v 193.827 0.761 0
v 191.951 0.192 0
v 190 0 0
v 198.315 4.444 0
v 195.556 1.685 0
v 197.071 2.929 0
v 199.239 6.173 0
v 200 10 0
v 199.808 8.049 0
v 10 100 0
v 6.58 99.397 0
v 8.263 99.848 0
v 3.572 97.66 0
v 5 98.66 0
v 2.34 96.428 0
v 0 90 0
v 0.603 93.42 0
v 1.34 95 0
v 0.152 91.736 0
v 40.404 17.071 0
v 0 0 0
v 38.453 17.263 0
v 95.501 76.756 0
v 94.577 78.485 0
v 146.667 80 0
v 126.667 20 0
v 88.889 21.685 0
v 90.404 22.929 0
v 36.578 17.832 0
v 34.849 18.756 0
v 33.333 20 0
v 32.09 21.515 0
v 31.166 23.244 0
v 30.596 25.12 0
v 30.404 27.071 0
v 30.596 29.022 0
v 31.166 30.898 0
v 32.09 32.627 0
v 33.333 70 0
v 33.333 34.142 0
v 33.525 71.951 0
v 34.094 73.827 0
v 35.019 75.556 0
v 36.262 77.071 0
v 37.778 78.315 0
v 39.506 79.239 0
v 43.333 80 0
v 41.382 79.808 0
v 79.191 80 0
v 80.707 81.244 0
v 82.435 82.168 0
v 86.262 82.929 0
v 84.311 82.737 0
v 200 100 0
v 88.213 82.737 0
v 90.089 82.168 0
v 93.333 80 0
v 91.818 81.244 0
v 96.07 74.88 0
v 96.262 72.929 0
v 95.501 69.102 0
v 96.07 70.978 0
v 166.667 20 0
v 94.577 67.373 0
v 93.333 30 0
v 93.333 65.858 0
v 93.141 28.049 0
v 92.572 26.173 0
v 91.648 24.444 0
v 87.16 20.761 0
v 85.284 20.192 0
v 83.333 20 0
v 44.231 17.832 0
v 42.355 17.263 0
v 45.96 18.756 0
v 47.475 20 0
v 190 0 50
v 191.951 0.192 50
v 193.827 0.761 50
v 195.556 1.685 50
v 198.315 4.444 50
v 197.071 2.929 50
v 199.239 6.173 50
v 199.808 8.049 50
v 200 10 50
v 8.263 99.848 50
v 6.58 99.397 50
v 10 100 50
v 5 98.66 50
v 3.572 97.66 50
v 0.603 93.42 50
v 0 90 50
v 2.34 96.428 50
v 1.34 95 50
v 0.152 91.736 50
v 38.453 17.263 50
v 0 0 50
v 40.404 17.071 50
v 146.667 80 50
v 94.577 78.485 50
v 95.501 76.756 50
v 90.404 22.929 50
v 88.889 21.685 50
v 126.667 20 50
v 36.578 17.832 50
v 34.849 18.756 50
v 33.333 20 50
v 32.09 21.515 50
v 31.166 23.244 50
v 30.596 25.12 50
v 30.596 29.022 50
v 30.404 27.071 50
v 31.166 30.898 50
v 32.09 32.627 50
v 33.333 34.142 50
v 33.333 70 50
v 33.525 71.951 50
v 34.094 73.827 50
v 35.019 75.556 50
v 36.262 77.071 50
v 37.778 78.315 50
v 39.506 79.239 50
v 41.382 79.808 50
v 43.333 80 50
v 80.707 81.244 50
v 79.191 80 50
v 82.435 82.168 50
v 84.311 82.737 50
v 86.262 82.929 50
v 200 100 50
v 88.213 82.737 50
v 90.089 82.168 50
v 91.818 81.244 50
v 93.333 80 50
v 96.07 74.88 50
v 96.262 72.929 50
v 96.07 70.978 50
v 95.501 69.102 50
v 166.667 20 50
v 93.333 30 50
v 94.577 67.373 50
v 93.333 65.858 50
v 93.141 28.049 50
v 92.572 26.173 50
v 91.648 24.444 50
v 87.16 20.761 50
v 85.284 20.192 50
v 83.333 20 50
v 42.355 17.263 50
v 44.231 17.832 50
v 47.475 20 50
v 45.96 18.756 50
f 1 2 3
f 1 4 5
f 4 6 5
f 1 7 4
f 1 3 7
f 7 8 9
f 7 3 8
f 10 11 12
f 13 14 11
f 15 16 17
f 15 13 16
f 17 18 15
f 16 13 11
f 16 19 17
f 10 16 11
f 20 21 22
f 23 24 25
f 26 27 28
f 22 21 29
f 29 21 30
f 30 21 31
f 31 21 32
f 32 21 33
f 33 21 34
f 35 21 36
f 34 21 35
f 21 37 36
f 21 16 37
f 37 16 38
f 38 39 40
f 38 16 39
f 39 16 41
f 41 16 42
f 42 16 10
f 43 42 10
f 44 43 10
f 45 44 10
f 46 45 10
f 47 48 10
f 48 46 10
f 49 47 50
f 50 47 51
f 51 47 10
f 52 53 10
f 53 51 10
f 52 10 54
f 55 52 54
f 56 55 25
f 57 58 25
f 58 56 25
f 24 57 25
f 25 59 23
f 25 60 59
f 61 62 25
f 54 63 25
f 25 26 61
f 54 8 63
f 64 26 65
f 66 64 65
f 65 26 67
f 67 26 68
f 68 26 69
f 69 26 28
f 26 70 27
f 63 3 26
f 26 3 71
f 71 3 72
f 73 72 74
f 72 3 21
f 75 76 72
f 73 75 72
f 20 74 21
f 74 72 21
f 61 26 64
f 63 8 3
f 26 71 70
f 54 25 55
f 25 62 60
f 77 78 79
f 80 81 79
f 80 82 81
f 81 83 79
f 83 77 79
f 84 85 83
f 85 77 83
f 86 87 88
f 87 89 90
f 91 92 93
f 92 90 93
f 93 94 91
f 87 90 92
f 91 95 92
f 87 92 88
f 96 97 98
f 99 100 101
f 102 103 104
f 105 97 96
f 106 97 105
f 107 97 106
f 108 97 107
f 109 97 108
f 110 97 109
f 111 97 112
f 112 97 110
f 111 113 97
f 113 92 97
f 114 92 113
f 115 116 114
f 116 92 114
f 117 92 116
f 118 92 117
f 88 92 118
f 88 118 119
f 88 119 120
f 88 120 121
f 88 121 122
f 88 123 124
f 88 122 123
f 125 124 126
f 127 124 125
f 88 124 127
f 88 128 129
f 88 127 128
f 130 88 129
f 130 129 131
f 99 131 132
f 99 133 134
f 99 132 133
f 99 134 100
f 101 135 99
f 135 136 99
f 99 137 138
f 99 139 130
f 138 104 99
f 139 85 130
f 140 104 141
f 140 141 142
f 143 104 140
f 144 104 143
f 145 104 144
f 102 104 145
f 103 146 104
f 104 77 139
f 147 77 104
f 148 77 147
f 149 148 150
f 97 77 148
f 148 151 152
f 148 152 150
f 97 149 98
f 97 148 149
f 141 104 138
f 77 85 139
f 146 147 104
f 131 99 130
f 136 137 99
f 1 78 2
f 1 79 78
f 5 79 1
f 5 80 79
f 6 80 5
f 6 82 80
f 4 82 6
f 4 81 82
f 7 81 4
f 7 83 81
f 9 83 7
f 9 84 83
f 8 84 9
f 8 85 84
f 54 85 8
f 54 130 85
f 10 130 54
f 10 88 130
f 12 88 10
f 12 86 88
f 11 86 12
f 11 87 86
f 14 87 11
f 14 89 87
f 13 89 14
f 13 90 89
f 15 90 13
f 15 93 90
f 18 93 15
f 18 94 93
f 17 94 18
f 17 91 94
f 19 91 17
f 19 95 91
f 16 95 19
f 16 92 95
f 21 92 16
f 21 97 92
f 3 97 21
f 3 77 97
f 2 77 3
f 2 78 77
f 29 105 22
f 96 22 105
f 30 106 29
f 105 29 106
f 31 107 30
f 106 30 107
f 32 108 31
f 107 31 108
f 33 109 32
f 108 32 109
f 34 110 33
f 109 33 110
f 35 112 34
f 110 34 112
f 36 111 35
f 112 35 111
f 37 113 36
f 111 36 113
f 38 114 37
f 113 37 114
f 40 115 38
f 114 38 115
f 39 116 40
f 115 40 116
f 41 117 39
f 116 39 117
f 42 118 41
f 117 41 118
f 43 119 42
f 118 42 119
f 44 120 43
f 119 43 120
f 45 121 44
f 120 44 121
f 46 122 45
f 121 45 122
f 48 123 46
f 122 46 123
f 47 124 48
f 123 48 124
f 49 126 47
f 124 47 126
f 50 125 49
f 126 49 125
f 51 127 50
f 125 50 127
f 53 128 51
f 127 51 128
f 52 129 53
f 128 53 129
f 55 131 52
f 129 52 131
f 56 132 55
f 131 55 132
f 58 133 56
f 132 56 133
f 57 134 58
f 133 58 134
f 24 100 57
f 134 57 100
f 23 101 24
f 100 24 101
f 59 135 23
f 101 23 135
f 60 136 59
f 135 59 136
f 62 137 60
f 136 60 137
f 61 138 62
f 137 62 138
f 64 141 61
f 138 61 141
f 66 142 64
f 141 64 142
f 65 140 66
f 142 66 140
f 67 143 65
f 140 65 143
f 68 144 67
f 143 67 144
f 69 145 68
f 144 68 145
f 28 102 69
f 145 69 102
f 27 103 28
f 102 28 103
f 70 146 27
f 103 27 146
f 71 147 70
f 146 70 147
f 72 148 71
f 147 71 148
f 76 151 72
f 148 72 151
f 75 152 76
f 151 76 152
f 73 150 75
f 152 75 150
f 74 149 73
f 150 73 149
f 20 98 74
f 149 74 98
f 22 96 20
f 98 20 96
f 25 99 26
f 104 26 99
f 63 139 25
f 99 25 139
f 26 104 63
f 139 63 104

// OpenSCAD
// Generated by Parametrix
ca_myPartF_faceCorners_000 = [ [ 0.0000, 0.0000 ],[ 190.0000, 0.0000 ],[ 191.9509, 0.1921 ],[ 193.8268, 0.7612 ],[ 195.5557, 1.6853 ],[ 197.0711, 2.9289 ],[ 198.3147, 4.4443 ],[ 199.2388, 6.1732 ],[ 199.8079, 8.0491 ],[ 200.0000, 10.0000 ],[ 200.0000, 100.0000 ],[ 10.0000, 100.0000 ],[ 8.2635, 99.8481 ],[ 6.5798, 99.3969 ],[ 5.0000, 98.6603 ],[ 3.5721, 97.6604 ],[ 2.3396, 96.4279 ],[ 1.3397, 95.0000 ],[ 0.6031, 93.4202 ],[ 0.1519, 91.7365 ],[ 0.0000, 90.0000 ],[ 0.0000, 0.0000 ] ];
cb_myPartF_faceCorners_000 = [  0, 1, 2, 3, 4, 5, 6, 7, 8, 9, 10, 11, 12, 13, 14, 15, 16, 17, 18, 19, 20, 21 ];
ca_myPartF_faceCorners_001 = [ [ 47.4755, 20.0000 ],[ 83.3333, 20.0000 ],[ 85.2842, 20.1921 ],[ 87.1602, 20.7612 ],[ 88.8890, 21.6853 ],[ 90.4044, 22.9289 ],[ 91.6480, 24.4443 ],[ 92.5721, 26.1732 ],[ 93.1412, 28.0491 ],[ 93.3333, 30.0000 ],[ 93.3333, 65.8579 ],[ 94.5770, 67.3732 ],[ 95.5011, 69.1021 ],[ 96.0701, 70.9780 ],[ 96.2623, 72.9289 ],[ 96.0701, 74.8798 ],[ 95.5011, 76.7558 ],[ 94.5770, 78.4846 ],[ 93.3333, 80.0000 ],[ 91.8180, 81.2436 ],[ 90.0891, 82.1677 ],[ 88.2132, 82.7368 ],[ 86.2623, 82.9289 ],[ 84.3114, 82.7368 ],[ 82.4354, 82.1677 ],[ 80.7066, 81.2436 ],[ 79.1912, 80.0000 ],[ 43.3333, 80.0000 ],[ 41.3824, 79.8079 ],[ 39.5065, 79.2388 ],[ 37.7776, 78.3147 ],[ 36.2623, 77.0711 ],[ 35.0186, 75.5557 ],[ 34.0945, 73.8268 ],[ 33.5255, 71.9509 ],[ 33.3333, 70.0000 ],[ 33.3333, 34.1421 ],[ 32.0897, 32.6268 ],[ 31.1656, 30.8979 ],[ 30.5965, 29.0220 ],[ 30.4044, 27.0711 ],[ 30.5965, 25.1202 ],[ 31.1656, 23.2442 ],[ 32.0897, 21.5154 ],[ 33.3333, 20.0000 ],[ 34.8487, 18.7564 ],[ 36.5776, 17.8323 ],[ 38.4535, 17.2632 ],[ 40.4044, 17.0711 ],[ 42.3553, 17.2632 ],[ 44.2312, 17.8323 ],[ 45.9601, 18.7564 ],[ 47.4755, 20.0000 ] ];
cb_myPartF_faceCorners_001 = [  22, 23, 24, 25, 26, 27, 28, 29, 30, 31, 32, 33, 34, 35, 36, 37, 38, 39, 40, 41, 42, 43, 44, 45, 46, 47, 48, 49, 50, 51, 52, 53, 54, 55, 56, 57, 58, 59, 60, 61, 62, 63, 64, 65, 66, 67, 68, 69, 70, 71, 72, 73, 74 ];
ca_myPartF_faceCorners_002 = [ [ 126.6667, 20.0000 ],[ 166.6667, 20.0000 ],[ 146.6667, 80.0000 ],[ 126.6667, 20.0000 ] ];
cb_myPartF_faceCorners_002 = [  75, 76, 77, 78 ];
a_myPartF_faceCorners = concat(ca_myPartF_faceCorners_000, ca_myPartF_faceCorners_001, ca_myPartF_faceCorners_002);
b_myPartF_faceCorners = [cb_myPartF_faceCorners_000, cb_myPartF_faceCorners_001, cb_myPartF_faceCorners_002];

module subpax_myPartF_corners () {
	translate( [ 0, 0, 0 ])
		rotate( [ 0, 0, 0 ])
			   linear_extrude(height = 50) polygon(a_myPartF_faceCorners, b_myPartF_faceCorners);
}

module pax_myPartF () {
	subpax_myPartF_corners();
}

pax_myPartF();
